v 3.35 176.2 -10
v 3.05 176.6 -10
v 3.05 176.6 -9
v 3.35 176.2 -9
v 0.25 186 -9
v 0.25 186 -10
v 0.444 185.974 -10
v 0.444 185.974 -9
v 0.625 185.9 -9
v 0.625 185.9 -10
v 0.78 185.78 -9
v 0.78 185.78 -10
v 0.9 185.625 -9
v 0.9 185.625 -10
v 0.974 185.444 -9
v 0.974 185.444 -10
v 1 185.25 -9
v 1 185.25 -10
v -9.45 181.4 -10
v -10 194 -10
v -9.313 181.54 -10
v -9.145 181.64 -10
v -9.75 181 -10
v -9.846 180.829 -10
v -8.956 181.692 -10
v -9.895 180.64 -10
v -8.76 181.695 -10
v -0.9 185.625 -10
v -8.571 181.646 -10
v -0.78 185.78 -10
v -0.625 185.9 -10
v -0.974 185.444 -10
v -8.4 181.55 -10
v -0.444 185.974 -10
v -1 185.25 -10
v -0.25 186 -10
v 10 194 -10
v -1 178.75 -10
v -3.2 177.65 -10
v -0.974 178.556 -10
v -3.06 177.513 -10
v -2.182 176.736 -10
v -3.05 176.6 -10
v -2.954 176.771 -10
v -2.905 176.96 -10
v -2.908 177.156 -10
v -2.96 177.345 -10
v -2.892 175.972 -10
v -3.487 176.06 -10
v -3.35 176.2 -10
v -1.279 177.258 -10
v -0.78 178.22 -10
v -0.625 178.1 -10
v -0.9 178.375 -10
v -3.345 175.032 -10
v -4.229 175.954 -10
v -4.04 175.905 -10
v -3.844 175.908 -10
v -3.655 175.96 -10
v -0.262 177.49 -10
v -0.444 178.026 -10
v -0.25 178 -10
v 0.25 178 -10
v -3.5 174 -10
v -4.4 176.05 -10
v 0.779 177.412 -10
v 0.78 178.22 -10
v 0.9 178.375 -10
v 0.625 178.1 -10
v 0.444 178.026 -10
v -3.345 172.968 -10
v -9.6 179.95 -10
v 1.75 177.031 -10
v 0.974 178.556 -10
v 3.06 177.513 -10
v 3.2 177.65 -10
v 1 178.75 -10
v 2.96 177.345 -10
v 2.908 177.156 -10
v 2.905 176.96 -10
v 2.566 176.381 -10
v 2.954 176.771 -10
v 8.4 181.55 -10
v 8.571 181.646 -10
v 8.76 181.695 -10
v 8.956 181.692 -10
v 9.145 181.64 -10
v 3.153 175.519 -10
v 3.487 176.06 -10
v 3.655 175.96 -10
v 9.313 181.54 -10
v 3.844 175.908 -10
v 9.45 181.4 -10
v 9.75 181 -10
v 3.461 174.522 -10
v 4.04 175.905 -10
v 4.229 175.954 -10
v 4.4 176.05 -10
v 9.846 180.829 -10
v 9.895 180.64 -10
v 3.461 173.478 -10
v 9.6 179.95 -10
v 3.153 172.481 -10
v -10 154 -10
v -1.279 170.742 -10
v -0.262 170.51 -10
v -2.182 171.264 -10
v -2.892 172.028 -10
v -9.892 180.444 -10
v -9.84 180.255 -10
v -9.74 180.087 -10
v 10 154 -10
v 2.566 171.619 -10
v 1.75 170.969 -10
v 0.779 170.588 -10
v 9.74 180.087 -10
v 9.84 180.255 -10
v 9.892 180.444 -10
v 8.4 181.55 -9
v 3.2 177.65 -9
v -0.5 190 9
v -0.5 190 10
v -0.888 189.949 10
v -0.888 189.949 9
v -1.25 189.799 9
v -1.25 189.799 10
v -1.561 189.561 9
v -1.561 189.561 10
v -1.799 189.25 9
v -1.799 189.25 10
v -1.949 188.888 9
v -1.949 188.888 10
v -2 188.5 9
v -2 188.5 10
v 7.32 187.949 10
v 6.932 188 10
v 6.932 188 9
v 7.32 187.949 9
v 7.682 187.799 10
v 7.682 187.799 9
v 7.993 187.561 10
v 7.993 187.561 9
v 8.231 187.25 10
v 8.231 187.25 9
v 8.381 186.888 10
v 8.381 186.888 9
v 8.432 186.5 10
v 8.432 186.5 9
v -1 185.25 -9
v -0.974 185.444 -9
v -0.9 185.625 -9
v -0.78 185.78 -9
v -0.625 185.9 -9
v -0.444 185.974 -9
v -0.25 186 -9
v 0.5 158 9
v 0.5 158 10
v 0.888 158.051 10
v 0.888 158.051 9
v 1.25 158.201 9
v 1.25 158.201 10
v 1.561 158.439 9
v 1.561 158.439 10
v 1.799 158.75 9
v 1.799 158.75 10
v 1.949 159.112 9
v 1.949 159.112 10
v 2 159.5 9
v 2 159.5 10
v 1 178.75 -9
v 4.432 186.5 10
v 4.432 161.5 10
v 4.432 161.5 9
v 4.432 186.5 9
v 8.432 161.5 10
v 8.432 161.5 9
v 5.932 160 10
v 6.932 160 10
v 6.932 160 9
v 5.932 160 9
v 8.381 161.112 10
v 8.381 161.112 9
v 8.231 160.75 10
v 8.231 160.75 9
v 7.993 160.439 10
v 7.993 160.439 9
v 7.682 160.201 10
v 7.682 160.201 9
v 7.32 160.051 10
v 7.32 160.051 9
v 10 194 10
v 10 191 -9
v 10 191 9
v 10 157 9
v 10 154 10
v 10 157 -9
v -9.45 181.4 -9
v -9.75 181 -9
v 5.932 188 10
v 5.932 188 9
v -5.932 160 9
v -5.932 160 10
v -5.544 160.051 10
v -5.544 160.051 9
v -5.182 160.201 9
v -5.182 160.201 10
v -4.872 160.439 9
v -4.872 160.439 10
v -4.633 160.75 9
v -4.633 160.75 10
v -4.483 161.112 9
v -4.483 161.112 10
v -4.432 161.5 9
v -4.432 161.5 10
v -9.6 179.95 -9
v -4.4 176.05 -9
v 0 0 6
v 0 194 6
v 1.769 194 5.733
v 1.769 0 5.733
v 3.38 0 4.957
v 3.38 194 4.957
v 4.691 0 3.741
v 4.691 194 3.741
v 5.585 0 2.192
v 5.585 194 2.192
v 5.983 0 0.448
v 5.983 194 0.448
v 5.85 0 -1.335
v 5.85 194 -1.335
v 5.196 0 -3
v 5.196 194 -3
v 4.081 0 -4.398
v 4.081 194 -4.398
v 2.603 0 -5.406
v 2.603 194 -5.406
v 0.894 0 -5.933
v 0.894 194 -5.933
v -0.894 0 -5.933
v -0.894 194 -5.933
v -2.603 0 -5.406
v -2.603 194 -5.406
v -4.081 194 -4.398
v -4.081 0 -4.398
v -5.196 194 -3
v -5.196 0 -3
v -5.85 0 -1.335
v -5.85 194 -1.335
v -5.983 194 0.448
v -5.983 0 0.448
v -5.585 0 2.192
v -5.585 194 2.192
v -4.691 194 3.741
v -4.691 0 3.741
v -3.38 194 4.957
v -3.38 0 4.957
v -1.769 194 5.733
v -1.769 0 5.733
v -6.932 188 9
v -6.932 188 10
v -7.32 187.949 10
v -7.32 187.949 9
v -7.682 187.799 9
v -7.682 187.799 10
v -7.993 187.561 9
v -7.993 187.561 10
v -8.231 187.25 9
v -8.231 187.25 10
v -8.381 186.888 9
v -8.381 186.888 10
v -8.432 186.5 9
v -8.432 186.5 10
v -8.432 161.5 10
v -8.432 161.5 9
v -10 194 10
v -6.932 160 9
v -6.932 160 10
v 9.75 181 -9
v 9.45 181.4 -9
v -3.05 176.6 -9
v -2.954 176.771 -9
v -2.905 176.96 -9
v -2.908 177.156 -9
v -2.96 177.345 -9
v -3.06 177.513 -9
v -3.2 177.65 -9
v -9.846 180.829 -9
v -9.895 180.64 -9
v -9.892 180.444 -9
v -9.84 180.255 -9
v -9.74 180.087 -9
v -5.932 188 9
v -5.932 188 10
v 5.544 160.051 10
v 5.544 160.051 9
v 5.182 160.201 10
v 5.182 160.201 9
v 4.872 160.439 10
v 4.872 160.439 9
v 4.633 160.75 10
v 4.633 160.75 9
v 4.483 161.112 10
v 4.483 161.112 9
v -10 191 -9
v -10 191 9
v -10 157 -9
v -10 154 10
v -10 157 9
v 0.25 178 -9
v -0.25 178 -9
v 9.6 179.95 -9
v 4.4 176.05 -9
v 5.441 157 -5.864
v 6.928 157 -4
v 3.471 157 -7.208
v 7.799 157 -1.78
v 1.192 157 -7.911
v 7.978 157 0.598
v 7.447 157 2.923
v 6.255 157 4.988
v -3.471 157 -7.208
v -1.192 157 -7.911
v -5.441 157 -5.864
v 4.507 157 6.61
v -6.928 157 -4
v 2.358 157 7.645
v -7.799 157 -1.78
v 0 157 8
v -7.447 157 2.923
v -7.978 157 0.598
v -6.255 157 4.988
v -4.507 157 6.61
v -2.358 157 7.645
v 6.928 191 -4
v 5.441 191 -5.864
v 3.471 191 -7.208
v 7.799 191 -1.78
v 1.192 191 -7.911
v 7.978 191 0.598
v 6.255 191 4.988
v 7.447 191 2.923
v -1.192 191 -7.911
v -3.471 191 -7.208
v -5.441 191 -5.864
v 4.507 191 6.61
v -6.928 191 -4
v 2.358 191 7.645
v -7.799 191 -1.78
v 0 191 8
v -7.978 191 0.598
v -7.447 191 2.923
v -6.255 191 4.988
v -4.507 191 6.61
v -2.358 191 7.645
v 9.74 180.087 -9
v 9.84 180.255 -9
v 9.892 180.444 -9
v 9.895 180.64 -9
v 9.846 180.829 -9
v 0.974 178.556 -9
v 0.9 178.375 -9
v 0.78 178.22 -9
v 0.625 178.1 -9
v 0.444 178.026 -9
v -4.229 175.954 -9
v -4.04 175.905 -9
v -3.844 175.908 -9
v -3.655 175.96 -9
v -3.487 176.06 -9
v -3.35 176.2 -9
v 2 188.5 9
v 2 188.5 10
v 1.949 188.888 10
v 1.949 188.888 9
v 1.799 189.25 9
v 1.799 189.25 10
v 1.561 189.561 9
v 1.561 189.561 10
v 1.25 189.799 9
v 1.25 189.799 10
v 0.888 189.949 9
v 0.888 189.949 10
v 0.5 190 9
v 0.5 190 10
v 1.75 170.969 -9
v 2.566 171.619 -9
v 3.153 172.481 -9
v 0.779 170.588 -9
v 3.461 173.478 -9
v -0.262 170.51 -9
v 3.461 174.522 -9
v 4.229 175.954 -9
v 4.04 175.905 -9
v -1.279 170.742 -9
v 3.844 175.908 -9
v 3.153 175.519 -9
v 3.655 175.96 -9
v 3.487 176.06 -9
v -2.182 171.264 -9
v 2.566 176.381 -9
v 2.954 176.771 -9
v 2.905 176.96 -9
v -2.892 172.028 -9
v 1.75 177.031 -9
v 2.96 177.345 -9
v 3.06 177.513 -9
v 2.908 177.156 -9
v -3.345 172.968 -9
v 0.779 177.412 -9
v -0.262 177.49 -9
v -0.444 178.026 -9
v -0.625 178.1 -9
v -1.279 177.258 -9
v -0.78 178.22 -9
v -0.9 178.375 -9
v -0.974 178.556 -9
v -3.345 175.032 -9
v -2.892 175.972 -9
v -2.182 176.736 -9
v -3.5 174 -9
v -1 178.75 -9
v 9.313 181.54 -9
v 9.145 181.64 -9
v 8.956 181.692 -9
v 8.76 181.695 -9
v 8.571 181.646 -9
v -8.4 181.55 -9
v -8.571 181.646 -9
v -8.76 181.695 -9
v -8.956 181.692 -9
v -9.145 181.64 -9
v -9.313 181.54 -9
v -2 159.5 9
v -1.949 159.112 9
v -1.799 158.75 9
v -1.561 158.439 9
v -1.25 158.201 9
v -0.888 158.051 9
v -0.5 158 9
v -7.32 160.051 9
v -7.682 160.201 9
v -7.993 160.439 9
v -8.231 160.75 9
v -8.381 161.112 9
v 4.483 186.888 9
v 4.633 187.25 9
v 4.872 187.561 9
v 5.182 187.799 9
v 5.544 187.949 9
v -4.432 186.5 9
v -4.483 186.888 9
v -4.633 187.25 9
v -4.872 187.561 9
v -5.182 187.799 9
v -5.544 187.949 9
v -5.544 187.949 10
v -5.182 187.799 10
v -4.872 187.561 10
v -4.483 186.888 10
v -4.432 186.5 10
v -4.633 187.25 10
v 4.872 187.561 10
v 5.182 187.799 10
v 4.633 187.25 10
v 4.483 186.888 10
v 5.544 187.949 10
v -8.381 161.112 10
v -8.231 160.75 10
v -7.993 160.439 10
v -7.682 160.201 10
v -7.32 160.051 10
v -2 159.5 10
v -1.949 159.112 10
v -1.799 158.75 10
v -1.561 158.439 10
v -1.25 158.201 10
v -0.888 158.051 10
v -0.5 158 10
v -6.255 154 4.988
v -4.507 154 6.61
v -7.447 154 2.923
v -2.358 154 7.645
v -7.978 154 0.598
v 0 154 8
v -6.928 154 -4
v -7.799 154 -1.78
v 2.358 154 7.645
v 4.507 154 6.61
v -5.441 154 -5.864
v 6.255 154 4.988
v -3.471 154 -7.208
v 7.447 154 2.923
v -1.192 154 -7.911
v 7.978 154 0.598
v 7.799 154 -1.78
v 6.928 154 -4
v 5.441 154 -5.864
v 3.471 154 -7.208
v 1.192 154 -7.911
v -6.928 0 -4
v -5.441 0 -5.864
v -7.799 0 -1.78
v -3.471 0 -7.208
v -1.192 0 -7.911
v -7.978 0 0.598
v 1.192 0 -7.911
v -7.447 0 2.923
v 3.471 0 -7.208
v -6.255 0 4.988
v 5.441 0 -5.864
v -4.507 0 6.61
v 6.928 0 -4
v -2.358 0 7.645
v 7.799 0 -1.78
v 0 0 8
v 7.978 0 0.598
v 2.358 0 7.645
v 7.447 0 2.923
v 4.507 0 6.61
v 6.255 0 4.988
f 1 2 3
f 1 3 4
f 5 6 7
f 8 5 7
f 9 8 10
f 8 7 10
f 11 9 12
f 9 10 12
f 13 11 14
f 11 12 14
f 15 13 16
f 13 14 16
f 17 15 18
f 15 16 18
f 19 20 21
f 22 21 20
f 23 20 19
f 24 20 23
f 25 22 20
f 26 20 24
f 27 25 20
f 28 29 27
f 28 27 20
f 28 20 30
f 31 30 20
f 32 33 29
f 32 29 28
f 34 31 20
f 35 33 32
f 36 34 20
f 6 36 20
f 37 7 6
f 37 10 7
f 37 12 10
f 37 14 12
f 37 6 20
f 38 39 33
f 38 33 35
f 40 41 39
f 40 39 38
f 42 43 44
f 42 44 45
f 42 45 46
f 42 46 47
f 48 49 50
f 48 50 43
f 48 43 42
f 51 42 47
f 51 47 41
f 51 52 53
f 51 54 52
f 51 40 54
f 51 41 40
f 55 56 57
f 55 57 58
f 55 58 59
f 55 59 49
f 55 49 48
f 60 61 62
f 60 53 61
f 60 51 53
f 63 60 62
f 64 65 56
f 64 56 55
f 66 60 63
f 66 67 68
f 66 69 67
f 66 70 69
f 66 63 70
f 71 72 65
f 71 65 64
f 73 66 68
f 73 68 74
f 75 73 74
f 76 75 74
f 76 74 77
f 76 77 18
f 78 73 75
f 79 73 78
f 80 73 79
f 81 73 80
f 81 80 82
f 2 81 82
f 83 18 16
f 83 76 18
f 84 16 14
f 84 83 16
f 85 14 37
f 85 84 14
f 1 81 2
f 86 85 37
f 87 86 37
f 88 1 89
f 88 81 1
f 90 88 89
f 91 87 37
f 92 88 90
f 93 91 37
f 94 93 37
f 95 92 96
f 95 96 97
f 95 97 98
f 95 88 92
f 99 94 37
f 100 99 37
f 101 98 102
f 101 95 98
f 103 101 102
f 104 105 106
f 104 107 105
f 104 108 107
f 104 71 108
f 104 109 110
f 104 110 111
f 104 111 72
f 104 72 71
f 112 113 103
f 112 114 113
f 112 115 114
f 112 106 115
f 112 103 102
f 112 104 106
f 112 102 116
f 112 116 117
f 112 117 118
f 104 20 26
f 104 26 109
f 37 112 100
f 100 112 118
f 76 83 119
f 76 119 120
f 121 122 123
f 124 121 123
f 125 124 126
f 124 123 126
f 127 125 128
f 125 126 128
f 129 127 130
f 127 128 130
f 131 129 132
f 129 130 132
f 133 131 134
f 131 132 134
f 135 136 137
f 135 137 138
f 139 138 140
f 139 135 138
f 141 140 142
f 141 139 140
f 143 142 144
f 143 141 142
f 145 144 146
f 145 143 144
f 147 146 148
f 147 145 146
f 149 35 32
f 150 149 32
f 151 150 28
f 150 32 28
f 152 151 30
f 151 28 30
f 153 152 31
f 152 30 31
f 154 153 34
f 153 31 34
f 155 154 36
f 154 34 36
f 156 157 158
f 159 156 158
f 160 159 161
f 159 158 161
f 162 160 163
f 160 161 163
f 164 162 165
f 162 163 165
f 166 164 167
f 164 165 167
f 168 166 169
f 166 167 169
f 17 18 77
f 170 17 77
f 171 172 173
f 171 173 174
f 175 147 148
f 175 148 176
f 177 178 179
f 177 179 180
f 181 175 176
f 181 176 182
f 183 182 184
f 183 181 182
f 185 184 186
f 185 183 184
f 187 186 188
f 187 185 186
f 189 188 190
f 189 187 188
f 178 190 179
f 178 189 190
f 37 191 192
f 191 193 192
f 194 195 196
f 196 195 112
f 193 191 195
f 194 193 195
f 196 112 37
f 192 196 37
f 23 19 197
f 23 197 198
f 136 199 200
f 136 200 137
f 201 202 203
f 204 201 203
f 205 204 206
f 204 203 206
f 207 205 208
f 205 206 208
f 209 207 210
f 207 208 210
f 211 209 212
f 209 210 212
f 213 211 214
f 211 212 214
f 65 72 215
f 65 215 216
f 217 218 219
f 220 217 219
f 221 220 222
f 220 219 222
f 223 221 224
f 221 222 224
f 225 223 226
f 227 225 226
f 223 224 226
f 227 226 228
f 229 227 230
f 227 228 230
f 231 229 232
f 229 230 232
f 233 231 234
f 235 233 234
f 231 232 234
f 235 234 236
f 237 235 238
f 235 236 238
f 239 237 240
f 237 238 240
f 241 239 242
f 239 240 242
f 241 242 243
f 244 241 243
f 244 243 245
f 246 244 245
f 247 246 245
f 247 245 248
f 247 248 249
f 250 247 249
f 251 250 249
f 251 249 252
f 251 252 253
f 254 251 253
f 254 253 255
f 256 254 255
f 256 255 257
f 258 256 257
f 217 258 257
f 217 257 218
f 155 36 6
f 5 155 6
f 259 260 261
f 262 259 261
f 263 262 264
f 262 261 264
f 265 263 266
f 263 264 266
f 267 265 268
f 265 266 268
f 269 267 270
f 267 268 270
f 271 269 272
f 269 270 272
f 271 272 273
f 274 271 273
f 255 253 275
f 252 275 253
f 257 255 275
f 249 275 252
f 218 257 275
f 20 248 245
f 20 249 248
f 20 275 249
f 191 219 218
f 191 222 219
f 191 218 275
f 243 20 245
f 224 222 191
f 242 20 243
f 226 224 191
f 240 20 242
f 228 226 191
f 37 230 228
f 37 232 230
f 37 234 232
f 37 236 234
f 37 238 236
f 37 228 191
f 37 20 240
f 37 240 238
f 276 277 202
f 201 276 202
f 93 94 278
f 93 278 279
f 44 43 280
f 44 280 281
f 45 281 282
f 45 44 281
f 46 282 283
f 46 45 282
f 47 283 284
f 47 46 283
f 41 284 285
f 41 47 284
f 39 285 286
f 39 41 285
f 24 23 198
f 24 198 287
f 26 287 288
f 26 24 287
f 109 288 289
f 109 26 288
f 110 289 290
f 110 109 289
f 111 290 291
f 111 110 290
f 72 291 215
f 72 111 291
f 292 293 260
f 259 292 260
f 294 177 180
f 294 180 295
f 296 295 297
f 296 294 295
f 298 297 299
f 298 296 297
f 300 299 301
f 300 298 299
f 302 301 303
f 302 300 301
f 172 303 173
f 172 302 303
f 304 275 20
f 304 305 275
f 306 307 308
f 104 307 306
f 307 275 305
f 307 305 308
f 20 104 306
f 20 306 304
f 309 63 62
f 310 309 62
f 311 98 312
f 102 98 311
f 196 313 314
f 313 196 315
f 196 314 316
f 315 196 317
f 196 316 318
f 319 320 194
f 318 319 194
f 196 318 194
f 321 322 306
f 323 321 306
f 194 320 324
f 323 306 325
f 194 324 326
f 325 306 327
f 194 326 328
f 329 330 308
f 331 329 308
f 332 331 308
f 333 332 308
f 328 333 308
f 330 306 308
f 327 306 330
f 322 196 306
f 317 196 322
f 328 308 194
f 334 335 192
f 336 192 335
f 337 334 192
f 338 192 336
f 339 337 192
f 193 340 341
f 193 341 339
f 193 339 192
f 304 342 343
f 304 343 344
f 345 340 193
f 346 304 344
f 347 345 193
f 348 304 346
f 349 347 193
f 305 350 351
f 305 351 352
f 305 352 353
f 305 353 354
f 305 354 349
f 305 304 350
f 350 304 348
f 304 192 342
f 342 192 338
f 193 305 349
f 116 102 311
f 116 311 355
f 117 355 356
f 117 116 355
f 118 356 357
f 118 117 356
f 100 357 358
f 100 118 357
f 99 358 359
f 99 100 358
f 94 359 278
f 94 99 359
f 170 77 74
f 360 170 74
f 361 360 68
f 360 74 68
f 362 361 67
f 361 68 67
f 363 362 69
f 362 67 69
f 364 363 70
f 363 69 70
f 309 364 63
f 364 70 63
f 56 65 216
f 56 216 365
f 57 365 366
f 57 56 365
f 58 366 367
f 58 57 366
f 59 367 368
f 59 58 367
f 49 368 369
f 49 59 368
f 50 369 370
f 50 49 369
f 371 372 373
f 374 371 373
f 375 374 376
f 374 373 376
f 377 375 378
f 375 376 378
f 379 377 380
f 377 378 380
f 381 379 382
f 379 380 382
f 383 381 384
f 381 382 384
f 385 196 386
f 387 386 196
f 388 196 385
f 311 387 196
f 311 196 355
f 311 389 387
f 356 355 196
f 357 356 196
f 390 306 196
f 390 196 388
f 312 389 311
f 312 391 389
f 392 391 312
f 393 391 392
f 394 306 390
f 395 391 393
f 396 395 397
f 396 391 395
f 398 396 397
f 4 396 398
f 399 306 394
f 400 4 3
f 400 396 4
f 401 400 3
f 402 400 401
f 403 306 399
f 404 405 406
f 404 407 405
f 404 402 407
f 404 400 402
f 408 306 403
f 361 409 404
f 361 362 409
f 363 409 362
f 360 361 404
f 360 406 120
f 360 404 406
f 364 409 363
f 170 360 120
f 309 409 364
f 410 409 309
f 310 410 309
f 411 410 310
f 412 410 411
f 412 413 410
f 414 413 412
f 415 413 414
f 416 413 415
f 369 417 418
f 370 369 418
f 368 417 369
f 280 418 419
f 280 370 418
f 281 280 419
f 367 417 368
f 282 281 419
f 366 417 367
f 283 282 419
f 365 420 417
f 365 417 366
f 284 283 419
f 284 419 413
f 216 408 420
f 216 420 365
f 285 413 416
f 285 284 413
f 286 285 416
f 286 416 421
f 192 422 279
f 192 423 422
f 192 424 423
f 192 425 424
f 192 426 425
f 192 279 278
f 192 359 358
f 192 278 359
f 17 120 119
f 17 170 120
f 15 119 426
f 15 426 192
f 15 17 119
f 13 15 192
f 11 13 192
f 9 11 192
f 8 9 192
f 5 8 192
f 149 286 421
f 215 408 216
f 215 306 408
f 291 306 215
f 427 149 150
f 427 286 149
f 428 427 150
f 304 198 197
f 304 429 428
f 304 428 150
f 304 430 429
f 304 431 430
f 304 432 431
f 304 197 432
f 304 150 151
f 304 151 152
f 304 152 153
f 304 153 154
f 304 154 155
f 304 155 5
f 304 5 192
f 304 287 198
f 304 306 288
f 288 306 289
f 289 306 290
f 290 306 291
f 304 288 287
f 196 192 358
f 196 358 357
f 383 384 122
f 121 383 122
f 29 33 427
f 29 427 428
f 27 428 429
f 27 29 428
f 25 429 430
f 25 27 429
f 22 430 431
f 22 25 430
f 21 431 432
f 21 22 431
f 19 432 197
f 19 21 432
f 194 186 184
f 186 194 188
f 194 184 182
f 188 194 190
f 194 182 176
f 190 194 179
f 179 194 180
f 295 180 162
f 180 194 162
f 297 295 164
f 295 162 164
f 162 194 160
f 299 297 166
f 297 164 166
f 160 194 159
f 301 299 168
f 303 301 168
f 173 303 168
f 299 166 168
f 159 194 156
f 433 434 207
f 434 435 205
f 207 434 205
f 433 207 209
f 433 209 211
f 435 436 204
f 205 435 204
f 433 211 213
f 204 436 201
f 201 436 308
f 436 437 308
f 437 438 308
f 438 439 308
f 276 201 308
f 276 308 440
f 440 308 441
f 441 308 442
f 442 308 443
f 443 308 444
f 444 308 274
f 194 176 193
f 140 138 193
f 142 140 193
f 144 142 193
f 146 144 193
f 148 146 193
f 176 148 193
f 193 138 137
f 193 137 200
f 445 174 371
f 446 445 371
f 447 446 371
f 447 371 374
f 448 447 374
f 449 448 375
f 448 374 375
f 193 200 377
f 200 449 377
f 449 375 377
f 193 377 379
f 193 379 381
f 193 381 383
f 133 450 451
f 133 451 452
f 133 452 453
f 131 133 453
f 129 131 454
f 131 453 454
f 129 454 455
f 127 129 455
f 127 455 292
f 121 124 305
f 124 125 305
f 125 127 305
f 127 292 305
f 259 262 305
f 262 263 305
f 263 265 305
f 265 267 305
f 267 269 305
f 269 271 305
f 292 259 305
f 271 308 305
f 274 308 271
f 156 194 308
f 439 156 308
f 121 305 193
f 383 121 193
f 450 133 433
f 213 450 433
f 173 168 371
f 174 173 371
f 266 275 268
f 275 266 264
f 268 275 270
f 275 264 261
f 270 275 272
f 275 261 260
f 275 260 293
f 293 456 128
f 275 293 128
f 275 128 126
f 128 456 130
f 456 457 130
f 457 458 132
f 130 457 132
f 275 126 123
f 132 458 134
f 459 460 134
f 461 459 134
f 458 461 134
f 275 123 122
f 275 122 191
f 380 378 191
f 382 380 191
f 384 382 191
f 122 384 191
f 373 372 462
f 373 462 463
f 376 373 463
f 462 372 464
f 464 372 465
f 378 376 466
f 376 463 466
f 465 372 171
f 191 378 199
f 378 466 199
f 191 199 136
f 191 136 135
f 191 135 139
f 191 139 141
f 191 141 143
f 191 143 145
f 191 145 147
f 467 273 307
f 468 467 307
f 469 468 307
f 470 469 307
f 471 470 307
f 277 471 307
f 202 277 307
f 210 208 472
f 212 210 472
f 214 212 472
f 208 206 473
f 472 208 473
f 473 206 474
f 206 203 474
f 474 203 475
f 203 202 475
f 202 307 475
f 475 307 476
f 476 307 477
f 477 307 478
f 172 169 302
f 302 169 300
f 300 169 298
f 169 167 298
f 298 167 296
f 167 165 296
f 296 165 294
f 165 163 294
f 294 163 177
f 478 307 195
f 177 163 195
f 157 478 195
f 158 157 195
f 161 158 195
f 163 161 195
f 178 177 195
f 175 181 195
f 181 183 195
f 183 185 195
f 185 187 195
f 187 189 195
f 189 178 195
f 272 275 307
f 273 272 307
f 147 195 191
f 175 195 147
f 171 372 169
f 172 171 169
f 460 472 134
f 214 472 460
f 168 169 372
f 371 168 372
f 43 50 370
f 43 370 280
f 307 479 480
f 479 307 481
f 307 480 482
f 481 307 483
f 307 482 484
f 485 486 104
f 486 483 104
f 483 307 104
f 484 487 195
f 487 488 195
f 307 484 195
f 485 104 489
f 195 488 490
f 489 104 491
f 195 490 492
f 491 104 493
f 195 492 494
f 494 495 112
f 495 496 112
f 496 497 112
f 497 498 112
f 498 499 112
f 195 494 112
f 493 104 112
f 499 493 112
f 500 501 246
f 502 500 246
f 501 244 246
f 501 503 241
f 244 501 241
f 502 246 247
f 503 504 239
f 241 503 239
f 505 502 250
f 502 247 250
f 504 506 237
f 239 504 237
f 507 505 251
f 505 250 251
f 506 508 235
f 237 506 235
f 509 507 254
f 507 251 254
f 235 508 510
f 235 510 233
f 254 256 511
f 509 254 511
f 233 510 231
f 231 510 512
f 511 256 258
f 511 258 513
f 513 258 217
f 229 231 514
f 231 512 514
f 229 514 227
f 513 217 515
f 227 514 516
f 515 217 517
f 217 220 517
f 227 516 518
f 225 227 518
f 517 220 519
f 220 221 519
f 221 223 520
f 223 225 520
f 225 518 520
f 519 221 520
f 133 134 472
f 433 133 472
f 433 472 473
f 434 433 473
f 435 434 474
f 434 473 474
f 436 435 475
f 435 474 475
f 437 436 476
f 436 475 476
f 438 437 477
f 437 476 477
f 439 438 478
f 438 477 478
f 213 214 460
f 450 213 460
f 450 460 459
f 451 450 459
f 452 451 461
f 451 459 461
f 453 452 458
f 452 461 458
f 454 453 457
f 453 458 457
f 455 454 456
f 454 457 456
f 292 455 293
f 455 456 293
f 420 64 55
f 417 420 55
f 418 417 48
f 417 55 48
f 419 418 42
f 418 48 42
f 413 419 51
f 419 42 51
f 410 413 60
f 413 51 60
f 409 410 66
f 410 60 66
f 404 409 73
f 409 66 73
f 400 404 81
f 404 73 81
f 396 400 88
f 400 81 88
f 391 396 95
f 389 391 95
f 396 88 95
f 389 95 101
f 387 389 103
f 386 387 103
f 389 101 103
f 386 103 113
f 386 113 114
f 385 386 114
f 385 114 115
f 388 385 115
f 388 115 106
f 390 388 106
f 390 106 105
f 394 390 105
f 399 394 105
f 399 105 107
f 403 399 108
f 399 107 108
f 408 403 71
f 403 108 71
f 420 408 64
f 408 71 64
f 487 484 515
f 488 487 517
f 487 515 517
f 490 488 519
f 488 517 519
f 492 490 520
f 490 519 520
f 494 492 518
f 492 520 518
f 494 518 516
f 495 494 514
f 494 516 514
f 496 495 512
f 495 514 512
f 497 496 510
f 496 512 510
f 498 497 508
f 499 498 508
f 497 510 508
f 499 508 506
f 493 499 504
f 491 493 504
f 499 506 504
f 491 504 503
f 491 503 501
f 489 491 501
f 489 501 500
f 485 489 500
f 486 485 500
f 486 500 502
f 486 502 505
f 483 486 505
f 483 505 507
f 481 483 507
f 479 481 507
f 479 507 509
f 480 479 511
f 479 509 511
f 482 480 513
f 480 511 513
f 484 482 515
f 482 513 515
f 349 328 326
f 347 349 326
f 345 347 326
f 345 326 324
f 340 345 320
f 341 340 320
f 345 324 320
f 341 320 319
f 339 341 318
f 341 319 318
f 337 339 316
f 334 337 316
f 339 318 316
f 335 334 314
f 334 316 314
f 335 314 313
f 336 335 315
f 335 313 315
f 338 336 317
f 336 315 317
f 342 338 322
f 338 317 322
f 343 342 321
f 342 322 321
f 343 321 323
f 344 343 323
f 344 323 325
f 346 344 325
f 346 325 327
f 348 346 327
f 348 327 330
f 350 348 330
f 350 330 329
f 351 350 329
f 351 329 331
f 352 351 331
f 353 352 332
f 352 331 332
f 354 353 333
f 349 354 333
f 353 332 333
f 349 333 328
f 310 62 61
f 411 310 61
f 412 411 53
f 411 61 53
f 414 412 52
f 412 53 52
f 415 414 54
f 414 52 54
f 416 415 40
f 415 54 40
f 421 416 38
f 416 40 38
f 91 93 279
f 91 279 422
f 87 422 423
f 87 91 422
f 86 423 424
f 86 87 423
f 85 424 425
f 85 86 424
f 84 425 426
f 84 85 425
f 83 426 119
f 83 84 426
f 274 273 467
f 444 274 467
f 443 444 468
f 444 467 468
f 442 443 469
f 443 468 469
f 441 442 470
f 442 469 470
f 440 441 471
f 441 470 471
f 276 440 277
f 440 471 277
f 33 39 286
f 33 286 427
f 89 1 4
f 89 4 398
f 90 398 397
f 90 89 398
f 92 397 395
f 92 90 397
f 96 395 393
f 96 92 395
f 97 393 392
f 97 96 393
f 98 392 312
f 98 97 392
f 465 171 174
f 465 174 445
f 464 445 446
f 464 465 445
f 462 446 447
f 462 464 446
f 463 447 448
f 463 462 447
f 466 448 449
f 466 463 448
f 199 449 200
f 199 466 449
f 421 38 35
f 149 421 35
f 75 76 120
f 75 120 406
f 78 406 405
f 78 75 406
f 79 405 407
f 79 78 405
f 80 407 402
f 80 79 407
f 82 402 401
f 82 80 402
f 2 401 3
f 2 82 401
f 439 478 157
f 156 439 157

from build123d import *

# Parameters (mm, degrees)
SKETCH1_R           = 8
BOSS_EXTRUDE1_DEPTH = 154
SKETCH2_W           = 20
SKETCH2_H           = 20
BOSS_EXTRUDE2_DEPTH = 40
SKETCH3_W           = 18
SKETCH3_H           = 34
CUT_EXTRUDE1_DEPTH  = 196.28440798
SKETCH6_R           = 8
BOSS_EXTRUDE3_DEPTH = 34
SKETCH7_R           = 3.5
CUT_EXTRUDE4_DEPTH  = 1
CUT_EXTRUDE5_DEPTH  = 1
SKETCH4_R           = 6
CUT_EXTRUDE3_DEPTH  = 195.514780929


with BuildPart() as part:
    # Sketch1 → Boss-Extrude1 (new body)
    with BuildSketch(Plane(origin=(0, 0, 0), x_dir=(1, 0, 0), z_dir=(0, 1, 0))):
        with Locations(Location((0, 0, 0), (0, 0, 270))):
            Circle(SKETCH1_R)
    extrude(amount=BOSS_EXTRUDE1_DEPTH)

    # Sketch2 → Boss-Extrude2 (add)
    with BuildSketch(Plane(origin=(0, 154, 0), x_dir=(1, 0, 0), z_dir=(0, 1, 0))):
        Rectangle(SKETCH2_W, SKETCH2_H)
    extrude(amount=BOSS_EXTRUDE2_DEPTH)

    # Sketch3 → Cut-Extrude1 (cut, through all)
    with BuildSketch(Plane.ZY.offset(10)):
        with Locations((0, 174)):
            Rectangle(SKETCH3_W, SKETCH3_H)
    extrude(amount=-CUT_EXTRUDE1_DEPTH, mode=Mode.SUBTRACT)

    # Sketch6 → Boss-Extrude3 (add)
    with BuildSketch(Plane(origin=(0, 157, 0), x_dir=(1, 0, 0), z_dir=(0, 1, 0))):
        with Locations(Location((0, 0, 0), (0, 0, 270))):
            Circle(SKETCH6_R)
    extrude(amount=BOSS_EXTRUDE3_DEPTH)

    # Sketch7 → Cut-Extrude4 (cut)
    with BuildSketch(Plane(origin=(0, 0, -10), x_dir=(-1, 0, 0), z_dir=(0, 0, -1))):
        with Locations((0, 174)):
            Circle(SKETCH7_R)
        with BuildLine():
            Line((-0.25, 178), (0.25, 178))
            ThreePointArc((0.25, 178), (0.780330086, 178.219669914), (1, 178.75))
            Line((1, 178.75), (1, 185.25))
            ThreePointArc((1, 185.25), (0.780330086, 185.780330086), (0.25, 186))
            Line((0.25, 186), (-0.25, 186))
            ThreePointArc((-0.25, 186), (-0.780330086, 185.780330086), (-1, 185.25))
            Line((-1, 185.25), (-1, 178.75))
            ThreePointArc((-1, 178.75), (-0.780330086, 178.219669914), (-0.25, 178))
        make_face()
        with BuildLine():
            Line((-4.4, 176.05), (-9.6, 179.95))
            ThreePointArc((-9.6, 179.95), (-9.89246212, 180.443933983), (-9.75, 181))
            Line((-9.75, 181), (-9.45, 181.4))
            ThreePointArc((-9.45, 181.4), (-8.956066017, 181.69246212), (-8.4, 181.55))
            Line((-8.4, 181.55), (-3.2, 177.65))
            ThreePointArc((-3.2, 177.65), (-2.90753788, 177.156066017), (-3.05, 176.6))
            Line((-3.05, 176.6), (-3.35, 176.2))
            ThreePointArc((-3.35, 176.2), (-3.843933983, 175.90753788), (-4.4, 176.05))
        make_face()
        with BuildLine():
            Line((3.2, 177.65), (8.4, 181.55))
            ThreePointArc((8.4, 181.55), (8.956066017, 181.69246212), (9.45, 181.4))
            Line((9.45, 181.4), (9.75, 181))
            ThreePointArc((9.75, 181), (9.89246212, 180.443933983), (9.6, 179.95))
            Line((9.6, 179.95), (4.4, 176.05))
            ThreePointArc((4.4, 176.05), (3.843933983, 175.90753788), (3.35, 176.2))
            Line((3.35, 176.2), (3.05, 176.6))
            ThreePointArc((3.05, 176.6), (2.90753788, 177.156066017), (3.2, 177.65))
        make_face()
        with BuildLine():
            Line((3.35, 263.8), (3.05, 263.4))
            ThreePointArc((3.05, 263.4), (2.90753788, 262.843933983), (3.2, 262.35))
            Line((3.2, 262.35), (8.4, 258.45))
            ThreePointArc((8.4, 258.45), (8.956066017, 258.30753788), (9.45, 258.6))
            Line((9.45, 258.6), (9.75, 259))
            ThreePointArc((9.75, 259), (9.89246212, 259.556066017), (9.6, 260.05))
            Line((9.6, 260.05), (4.4, 263.95))
            ThreePointArc((4.4, 263.95), (3.843933983, 264.09246212), (3.35, 263.8))
        make_face()
        with BuildLine():
            Line((-3.05, 263.4), (-3.35, 263.8))
            ThreePointArc((-3.35, 263.8), (-3.843933983, 264.09246212), (-4.4, 263.95))
            Line((-4.4, 263.95), (-9.6, 260.05))
            ThreePointArc((-9.6, 260.05), (-9.89246212, 259.556066017), (-9.75, 259))
            Line((-9.75, 259), (-9.45, 258.6))
            ThreePointArc((-9.45, 258.6), (-8.956066017, 258.30753788), (-8.4, 258.45))
            Line((-8.4, 258.45), (-3.2, 262.35))
            ThreePointArc((-3.2, 262.35), (-2.90753788, 262.843933983), (-3.05, 263.4))
        make_face()
        with BuildLine():
            Line((1, 261.25), (1, 254.75))
            ThreePointArc((1, 254.75), (0.780330086, 254.219669914), (0.25, 254))
            Line((0.25, 254), (-0.25, 254))
            ThreePointArc((-0.25, 254), (-0.780330086, 254.219669914), (-1, 254.75))
            Line((-1, 254.75), (-1, 261.25))
            ThreePointArc((-1, 261.25), (-0.780330086, 261.780330086), (-0.25, 262))
            Line((-0.25, 262), (0.25, 262))
            ThreePointArc((0.25, 262), (0.780330086, 261.780330086), (1, 261.25))
        make_face()
    extrude(amount=-CUT_EXTRUDE4_DEPTH, mode=Mode.SUBTRACT)

    # Sketch8 → Cut-Extrude5 (cut)
    with BuildSketch(Plane.XY.offset(10)):
        with BuildLine():
            Line((-0.5, 158), (0.5, 158))
            ThreePointArc((0.5, 158), (1.560660172, 158.439339828), (2, 159.5))
            Line((2, 159.5), (2, 188.5))
            ThreePointArc((2, 188.5), (1.560660172, 189.560660172), (0.5, 190))
            Line((0.5, 190), (-0.5, 190))
            ThreePointArc((-0.5, 190), (-1.560660172, 189.560660172), (-2, 188.5))
            Line((-2, 188.5), (-2, 159.5))
            ThreePointArc((-2, 159.5), (-1.560660172, 158.439339828), (-0.5, 158))
        make_face()
        with BuildLine():
            Line((-6.932239868, 160), (-5.932239868, 160))
            ThreePointArc((-5.932239868, 160), (-4.871579696, 160.439339828), (-4.432239868, 161.5))
            Line((-4.432239868, 161.5), (-4.432239868, 186.5))
            ThreePointArc((-4.432239868, 186.5), (-4.871579696, 187.560660172), (-5.932239868, 188))
            Line((-5.932239868, 188), (-6.932239868, 188))
            ThreePointArc((-6.932239868, 188), (-7.992900039, 187.560660172), (-8.432239868, 186.5))
            Line((-8.432239868, 186.5), (-8.432239868, 161.5))
            ThreePointArc((-8.432239868, 161.5), (-7.992900039, 160.439339828), (-6.932239868, 160))
        make_face()
        with BuildLine():
            Line((4.432239868, 161.5), (4.432239868, 186.5))
            ThreePointArc((4.432239868, 186.5), (4.871579696, 187.560660172), (5.932239868, 188))
            Line((5.932239868, 188), (6.932239868, 188))
            ThreePointArc((6.932239868, 188), (7.992900039, 187.560660172), (8.432239868, 186.5))
            Line((8.432239868, 186.5), (8.432239868, 161.5))
            ThreePointArc((8.432239868, 161.5), (7.992900039, 160.439339828), (6.932239868, 160))
            Line((6.932239868, 160), (5.932239868, 160))
            ThreePointArc((5.932239868, 160), (4.871579696, 160.439339828), (4.432239868, 161.5))
        make_face()
    extrude(amount=-CUT_EXTRUDE5_DEPTH, mode=Mode.SUBTRACT)

    # Sketch4 → Cut-Extrude3 (cut, through all)
    with BuildSketch(Plane(origin=(0, 194, 0), x_dir=(1, 0, 0), z_dir=(0, 1, 0))):
        with Locations(Location((0, 0, 0), (0, 0, 270))):
            Circle(SKETCH4_R)
    extrude(amount=-CUT_EXTRUDE3_DEPTH, mode=Mode.SUBTRACT)


solid = part.part
